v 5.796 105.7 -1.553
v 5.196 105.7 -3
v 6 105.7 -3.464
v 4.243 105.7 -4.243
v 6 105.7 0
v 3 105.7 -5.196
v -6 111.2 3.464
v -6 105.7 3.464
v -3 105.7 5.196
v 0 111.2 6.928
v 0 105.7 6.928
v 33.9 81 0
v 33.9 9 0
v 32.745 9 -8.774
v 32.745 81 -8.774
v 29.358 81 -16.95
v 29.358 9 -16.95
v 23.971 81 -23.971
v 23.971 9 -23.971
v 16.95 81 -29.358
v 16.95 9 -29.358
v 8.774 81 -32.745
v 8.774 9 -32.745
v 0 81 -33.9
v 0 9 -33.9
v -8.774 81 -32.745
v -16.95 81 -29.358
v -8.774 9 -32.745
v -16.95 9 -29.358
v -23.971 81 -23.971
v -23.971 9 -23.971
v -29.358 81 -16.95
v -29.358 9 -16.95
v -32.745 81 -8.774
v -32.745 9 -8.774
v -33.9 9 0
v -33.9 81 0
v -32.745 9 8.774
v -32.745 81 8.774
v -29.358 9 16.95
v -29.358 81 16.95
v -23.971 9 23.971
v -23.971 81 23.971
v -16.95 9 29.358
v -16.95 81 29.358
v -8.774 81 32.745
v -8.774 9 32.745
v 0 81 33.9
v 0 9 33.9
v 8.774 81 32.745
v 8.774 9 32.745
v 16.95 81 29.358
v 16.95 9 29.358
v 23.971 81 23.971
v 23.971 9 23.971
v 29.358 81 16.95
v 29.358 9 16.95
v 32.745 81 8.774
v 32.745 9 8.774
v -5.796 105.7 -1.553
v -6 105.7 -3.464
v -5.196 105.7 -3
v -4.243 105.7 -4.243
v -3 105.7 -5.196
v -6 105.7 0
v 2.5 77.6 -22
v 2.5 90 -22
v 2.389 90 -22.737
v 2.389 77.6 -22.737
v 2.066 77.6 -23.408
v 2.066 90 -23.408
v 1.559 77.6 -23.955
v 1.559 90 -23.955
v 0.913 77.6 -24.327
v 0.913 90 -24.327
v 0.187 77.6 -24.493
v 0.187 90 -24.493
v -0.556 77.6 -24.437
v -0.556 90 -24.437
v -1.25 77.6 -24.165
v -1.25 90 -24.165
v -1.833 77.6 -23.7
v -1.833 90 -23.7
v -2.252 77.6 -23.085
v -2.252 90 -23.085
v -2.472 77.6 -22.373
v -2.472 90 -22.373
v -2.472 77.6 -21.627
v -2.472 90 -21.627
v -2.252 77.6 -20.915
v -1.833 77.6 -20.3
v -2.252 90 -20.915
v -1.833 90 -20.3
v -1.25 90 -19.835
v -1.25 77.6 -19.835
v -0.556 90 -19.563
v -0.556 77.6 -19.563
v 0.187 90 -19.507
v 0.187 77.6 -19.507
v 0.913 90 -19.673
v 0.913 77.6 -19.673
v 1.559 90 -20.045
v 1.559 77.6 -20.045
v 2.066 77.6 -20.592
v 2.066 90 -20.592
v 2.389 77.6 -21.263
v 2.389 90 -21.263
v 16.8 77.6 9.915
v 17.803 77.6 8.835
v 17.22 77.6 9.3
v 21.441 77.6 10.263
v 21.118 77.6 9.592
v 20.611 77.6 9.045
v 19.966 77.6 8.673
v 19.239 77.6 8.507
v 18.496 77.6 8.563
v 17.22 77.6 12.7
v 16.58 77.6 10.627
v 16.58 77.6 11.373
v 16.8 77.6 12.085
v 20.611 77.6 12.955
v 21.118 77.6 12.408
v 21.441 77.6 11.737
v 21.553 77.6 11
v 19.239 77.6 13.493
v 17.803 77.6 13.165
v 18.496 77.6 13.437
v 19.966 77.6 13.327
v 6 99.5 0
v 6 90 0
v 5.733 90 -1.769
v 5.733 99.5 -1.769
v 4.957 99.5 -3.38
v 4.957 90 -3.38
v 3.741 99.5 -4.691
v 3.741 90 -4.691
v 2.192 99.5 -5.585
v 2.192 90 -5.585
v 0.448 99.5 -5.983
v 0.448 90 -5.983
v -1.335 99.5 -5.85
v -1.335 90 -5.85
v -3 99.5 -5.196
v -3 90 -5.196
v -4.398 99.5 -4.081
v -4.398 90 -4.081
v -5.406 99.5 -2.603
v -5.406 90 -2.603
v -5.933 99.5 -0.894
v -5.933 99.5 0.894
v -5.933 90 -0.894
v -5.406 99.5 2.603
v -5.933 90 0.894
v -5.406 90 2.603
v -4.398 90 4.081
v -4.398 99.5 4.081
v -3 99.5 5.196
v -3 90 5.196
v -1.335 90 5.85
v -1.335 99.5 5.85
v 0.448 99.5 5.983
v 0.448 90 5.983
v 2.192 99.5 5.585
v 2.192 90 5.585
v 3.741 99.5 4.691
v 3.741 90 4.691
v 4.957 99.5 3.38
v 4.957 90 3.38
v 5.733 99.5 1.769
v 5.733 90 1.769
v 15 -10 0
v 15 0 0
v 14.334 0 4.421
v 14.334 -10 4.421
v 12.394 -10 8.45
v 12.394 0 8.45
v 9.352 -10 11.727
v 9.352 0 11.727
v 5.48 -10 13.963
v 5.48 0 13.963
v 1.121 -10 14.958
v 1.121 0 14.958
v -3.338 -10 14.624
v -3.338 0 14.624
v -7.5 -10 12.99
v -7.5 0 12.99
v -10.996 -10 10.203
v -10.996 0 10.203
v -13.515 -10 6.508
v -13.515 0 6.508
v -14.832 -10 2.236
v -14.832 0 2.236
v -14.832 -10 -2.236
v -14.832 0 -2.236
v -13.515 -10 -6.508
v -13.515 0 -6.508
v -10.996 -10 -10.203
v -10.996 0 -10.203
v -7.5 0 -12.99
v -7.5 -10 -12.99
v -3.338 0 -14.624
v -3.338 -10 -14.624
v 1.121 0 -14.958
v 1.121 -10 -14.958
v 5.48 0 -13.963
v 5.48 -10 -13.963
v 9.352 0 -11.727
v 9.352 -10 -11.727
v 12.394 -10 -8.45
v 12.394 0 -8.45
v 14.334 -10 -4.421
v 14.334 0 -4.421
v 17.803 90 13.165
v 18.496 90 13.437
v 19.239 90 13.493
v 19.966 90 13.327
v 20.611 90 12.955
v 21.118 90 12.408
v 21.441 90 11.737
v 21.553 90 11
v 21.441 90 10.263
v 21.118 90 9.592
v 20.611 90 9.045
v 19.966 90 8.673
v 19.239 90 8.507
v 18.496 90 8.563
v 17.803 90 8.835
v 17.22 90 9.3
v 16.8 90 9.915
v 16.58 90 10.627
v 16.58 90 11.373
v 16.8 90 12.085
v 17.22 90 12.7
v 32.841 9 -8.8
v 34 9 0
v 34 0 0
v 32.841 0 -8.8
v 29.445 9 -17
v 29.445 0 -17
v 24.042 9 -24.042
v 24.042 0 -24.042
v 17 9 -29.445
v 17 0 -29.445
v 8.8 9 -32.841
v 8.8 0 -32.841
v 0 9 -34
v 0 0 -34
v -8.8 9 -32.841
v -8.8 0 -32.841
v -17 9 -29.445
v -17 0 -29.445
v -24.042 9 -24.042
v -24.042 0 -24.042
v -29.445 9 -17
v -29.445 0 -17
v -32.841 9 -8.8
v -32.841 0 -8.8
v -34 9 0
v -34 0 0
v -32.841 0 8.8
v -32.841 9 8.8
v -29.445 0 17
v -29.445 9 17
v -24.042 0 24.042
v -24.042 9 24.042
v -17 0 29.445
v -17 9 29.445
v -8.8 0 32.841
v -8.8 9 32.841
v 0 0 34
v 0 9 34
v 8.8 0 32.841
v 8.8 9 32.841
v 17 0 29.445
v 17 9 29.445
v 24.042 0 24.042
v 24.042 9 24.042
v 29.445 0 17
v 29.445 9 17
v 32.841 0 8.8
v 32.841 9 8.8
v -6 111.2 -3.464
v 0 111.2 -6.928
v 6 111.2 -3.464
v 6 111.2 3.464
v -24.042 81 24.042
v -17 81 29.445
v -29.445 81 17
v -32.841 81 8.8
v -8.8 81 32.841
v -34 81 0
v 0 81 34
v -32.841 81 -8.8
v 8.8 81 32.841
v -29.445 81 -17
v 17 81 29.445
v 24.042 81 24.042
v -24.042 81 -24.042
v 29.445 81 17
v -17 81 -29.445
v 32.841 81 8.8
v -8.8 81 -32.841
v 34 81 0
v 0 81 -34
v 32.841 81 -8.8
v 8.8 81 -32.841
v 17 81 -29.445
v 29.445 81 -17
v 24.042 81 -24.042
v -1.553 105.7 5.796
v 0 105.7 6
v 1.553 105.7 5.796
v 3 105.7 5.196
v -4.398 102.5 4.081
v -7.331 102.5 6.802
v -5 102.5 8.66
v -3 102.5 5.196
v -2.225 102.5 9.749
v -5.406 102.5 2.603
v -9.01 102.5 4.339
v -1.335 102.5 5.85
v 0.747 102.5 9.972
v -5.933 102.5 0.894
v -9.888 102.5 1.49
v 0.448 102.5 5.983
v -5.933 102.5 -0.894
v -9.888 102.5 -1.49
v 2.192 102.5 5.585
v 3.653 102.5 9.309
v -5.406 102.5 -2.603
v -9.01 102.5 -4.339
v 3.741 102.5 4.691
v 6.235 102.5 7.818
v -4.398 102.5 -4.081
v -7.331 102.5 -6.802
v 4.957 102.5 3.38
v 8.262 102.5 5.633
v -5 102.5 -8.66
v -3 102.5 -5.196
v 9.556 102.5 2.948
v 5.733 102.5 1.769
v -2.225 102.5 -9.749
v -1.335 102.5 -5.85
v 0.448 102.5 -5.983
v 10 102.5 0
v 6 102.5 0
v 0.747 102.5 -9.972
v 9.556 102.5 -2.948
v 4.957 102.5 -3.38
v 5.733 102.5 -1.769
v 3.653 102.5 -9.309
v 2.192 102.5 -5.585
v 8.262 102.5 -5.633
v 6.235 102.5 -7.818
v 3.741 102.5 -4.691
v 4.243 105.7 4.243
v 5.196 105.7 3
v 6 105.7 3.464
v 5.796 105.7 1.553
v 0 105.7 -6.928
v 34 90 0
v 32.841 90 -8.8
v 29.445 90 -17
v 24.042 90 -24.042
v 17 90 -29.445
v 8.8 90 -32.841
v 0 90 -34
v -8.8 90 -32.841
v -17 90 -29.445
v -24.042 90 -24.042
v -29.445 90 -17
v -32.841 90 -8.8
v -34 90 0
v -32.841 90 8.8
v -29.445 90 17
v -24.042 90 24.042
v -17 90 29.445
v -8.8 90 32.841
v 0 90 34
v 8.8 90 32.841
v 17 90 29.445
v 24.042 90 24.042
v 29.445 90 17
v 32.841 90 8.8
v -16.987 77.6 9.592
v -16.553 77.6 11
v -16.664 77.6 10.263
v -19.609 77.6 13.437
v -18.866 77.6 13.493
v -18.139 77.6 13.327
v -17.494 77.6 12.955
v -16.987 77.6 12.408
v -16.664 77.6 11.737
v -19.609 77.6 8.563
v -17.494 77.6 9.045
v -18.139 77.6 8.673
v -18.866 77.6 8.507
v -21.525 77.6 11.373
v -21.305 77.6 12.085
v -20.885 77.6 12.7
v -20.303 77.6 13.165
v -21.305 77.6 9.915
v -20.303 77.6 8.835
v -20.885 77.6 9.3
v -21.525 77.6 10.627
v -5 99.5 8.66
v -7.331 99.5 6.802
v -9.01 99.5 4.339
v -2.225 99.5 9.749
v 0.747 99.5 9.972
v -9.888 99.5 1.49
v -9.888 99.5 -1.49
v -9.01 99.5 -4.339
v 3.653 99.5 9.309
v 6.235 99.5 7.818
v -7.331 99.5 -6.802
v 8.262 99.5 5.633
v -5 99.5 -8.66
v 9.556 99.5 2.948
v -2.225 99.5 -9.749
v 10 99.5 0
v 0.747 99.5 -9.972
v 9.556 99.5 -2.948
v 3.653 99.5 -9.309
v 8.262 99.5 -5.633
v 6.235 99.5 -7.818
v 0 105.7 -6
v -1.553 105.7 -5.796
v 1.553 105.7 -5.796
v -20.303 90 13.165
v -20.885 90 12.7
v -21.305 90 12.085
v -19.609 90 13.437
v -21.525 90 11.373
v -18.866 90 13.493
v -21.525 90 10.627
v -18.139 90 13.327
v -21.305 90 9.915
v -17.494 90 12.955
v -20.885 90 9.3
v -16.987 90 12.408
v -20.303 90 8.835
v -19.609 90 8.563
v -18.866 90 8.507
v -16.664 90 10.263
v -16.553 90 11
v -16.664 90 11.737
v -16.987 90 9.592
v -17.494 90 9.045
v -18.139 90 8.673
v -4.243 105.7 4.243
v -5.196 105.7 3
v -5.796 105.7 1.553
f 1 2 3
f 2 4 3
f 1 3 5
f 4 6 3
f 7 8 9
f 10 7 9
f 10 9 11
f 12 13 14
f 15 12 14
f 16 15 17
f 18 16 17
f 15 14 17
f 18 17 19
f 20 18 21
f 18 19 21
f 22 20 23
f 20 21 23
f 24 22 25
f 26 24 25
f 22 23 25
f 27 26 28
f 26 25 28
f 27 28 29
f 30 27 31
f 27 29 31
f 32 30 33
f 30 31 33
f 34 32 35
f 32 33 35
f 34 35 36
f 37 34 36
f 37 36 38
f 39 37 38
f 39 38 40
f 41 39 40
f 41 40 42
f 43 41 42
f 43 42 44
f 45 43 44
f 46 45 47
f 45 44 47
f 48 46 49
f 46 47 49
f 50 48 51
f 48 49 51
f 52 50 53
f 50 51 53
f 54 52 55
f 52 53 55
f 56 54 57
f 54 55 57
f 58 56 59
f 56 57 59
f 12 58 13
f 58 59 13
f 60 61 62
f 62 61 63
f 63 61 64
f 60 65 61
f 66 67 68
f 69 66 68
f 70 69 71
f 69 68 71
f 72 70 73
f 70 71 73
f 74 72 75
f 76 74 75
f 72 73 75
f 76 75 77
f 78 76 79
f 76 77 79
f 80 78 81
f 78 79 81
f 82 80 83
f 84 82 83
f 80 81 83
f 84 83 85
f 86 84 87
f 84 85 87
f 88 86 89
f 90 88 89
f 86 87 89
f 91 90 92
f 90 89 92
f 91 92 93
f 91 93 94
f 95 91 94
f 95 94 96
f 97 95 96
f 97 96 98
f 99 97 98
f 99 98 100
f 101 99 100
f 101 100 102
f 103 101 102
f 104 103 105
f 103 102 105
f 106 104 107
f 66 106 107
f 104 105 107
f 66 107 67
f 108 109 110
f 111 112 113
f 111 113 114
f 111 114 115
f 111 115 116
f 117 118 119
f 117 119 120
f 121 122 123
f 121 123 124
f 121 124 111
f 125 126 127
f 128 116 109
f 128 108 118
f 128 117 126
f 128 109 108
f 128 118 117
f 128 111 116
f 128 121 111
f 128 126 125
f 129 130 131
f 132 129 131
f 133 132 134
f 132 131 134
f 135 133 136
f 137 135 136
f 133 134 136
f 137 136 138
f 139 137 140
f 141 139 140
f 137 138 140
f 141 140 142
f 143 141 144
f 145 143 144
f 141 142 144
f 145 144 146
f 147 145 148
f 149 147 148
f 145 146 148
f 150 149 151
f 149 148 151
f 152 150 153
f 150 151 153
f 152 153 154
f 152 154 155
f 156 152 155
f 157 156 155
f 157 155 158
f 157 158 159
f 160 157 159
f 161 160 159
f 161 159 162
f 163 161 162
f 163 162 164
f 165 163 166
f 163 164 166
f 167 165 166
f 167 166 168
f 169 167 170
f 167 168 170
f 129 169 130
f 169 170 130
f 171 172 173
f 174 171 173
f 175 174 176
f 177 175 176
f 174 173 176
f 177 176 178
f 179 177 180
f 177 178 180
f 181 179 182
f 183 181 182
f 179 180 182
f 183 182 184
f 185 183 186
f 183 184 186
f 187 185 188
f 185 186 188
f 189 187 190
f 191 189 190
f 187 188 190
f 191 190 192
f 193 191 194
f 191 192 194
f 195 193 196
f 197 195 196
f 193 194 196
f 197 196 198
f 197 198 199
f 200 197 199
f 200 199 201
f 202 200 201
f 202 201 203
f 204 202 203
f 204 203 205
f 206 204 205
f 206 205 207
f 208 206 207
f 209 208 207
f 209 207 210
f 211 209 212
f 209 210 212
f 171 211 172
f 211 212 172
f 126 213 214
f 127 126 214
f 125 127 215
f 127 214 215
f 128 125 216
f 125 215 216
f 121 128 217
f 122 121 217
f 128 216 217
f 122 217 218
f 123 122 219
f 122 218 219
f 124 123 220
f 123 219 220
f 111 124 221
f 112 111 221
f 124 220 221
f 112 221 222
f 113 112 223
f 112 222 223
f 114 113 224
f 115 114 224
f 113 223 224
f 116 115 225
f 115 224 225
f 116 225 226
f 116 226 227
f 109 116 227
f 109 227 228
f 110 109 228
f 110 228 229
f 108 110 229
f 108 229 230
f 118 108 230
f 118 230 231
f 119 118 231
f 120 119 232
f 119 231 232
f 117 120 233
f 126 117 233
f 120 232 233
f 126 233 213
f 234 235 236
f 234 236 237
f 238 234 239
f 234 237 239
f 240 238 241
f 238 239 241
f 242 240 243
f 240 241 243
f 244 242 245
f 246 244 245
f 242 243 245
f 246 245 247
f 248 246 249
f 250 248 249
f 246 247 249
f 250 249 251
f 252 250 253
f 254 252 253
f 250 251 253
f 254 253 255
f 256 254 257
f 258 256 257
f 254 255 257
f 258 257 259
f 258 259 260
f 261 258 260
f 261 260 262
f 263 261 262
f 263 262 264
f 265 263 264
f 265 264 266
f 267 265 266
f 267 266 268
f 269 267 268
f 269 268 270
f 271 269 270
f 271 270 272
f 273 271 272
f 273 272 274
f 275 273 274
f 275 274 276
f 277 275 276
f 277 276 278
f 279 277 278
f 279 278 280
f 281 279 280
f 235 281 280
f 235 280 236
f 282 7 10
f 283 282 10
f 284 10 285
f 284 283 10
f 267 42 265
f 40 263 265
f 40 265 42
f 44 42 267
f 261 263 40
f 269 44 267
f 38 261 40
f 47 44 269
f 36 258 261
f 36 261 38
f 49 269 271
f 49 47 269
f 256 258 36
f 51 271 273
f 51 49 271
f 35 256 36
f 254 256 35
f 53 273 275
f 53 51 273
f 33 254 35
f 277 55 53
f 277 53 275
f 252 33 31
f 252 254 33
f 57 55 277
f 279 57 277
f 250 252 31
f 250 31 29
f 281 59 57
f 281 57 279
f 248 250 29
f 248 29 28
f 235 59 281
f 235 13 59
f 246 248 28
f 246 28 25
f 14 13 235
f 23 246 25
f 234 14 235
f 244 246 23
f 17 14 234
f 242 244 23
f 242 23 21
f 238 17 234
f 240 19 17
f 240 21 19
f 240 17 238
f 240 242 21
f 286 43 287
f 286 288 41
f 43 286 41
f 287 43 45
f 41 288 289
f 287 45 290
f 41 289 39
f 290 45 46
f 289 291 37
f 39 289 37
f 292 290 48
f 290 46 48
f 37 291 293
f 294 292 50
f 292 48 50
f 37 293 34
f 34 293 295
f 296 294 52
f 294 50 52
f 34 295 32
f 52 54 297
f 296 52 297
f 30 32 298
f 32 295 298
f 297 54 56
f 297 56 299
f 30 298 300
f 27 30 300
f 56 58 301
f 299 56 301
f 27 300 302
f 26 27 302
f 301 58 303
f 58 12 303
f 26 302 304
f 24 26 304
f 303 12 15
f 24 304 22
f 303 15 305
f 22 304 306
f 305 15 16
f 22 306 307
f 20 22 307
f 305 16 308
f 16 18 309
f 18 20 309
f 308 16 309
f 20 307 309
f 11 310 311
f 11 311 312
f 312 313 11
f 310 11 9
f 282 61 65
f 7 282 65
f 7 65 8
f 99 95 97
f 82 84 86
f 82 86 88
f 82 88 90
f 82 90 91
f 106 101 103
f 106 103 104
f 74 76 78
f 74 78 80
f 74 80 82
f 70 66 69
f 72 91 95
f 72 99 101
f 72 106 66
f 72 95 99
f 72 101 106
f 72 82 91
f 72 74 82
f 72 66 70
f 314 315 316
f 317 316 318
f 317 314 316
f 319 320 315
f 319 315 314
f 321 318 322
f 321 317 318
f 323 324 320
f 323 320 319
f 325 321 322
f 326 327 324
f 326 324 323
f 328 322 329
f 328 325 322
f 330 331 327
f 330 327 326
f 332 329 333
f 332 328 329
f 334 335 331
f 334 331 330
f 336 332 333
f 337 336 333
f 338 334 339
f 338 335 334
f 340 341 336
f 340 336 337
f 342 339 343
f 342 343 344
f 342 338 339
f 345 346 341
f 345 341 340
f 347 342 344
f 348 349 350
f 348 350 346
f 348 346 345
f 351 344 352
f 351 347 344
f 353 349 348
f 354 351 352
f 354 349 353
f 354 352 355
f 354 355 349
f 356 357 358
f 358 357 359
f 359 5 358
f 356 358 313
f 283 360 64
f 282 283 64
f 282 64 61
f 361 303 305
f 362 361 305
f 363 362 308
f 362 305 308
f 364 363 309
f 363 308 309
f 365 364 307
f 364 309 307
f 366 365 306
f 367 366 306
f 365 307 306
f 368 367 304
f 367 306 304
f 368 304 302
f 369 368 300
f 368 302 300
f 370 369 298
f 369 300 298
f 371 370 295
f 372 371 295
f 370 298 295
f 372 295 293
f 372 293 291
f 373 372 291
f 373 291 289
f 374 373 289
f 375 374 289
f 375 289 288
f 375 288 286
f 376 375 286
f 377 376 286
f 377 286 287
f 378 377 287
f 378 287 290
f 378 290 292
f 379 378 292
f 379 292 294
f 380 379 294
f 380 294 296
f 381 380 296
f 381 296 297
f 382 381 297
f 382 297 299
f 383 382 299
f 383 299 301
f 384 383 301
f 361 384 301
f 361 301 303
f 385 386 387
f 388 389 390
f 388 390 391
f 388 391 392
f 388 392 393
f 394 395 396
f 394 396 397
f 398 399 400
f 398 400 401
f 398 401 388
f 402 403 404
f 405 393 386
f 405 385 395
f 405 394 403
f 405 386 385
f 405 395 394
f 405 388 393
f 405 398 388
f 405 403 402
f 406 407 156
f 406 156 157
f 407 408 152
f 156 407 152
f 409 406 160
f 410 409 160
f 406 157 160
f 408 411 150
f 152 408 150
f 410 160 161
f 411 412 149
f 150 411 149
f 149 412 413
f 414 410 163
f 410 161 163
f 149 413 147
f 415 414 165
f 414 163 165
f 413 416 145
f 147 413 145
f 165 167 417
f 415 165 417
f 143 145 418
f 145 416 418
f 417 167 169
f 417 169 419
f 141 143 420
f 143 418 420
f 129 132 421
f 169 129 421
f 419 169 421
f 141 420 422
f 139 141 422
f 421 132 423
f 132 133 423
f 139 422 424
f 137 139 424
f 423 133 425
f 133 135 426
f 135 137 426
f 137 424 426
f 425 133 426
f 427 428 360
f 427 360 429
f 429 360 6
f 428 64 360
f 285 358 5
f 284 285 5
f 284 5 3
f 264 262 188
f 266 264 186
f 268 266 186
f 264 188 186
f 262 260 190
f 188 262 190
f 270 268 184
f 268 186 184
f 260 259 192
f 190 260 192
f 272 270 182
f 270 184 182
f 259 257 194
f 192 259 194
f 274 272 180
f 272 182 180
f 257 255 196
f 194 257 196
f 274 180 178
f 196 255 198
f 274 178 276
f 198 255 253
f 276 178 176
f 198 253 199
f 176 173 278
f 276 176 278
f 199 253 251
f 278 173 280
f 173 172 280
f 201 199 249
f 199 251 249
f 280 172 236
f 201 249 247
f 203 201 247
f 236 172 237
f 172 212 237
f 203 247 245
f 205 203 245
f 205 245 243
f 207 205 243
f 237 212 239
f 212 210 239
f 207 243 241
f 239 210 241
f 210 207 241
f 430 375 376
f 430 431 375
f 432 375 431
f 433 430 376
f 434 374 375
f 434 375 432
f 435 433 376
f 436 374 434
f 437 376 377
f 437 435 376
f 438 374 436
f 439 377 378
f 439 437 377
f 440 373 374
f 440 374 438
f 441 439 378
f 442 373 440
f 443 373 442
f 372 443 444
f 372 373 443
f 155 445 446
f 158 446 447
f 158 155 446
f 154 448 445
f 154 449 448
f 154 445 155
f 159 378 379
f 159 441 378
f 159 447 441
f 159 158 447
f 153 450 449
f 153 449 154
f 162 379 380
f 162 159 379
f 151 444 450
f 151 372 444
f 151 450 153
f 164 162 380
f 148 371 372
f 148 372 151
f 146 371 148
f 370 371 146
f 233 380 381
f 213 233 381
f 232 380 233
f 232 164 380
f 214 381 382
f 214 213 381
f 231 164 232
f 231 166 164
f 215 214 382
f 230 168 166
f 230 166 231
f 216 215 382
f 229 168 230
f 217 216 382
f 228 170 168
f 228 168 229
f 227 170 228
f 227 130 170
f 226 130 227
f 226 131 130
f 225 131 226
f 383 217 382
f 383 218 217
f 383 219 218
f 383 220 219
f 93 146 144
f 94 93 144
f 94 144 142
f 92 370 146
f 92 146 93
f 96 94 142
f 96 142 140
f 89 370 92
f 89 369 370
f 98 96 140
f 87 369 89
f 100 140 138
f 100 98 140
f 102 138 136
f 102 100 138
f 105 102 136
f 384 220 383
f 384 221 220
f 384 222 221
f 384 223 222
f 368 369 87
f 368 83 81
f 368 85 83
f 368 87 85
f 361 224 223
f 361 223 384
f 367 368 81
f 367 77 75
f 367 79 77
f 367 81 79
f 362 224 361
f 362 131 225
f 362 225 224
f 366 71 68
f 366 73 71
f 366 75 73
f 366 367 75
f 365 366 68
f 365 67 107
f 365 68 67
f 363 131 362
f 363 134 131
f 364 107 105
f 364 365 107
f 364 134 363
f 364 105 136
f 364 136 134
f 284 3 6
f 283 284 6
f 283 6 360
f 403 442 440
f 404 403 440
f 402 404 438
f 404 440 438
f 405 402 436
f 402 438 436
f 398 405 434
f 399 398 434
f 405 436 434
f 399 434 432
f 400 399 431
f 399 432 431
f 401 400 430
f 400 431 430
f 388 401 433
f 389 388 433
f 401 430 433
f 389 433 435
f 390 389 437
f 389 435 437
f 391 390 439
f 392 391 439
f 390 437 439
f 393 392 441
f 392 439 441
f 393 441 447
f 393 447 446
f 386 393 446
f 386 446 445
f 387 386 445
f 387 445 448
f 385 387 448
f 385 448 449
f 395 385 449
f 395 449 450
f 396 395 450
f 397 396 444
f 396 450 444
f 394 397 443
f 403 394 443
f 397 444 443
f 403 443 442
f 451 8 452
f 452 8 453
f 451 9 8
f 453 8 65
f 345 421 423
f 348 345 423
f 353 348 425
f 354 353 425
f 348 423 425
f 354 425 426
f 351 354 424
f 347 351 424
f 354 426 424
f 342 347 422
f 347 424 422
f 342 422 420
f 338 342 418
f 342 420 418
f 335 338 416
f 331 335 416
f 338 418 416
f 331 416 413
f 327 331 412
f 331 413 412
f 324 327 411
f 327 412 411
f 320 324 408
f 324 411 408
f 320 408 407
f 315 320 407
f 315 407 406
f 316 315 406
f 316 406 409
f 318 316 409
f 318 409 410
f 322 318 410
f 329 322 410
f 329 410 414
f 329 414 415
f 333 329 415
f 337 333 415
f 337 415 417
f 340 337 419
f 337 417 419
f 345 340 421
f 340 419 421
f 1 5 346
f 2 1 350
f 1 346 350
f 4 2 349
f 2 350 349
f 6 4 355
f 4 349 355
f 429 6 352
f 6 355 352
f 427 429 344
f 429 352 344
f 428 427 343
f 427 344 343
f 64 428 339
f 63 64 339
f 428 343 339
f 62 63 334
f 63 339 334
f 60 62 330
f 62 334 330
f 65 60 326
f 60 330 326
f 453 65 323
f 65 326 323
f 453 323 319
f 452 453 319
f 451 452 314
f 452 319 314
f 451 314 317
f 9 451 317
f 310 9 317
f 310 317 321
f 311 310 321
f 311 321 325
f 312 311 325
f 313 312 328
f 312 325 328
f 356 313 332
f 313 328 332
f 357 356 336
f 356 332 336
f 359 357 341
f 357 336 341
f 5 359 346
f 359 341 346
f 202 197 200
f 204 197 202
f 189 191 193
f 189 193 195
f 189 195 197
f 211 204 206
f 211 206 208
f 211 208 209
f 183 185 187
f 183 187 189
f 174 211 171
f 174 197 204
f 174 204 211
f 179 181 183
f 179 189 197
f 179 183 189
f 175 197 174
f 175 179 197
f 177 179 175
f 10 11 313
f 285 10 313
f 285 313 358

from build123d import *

# Parameters (mm, degrees)
SKETCH1_R                  = 34
MAINHOUSING_DEPTH          = 90
SKETCH2_R                  = 15
REARPART_DEPTH             = 10
SKETCH3_R                  = 6
SHAFT_DEPTH                = 9.5
SKETCH4_R                  = 10
GEAR_DEPTH                 = 3
HEXBOLT_DEPTH              = 8.7
SKETCH6_R                  = 10
SKETCH6_R_2                = 6
HEXBOLTCUTOUT_DEPTH        = 3.2
TOP_BOTTOMSEPERATION_START = 9
SKETCH7_R                  = 34
SKETCH7_R_2                = 33.9
TOP_BOTTOMSEPERATION_DEPTH = 72
SKETCH8_R                  = 2.5
SCREWHOLE_DEPTH            = 12.4
SCREWHOLEPATTERN_COUNT     = 3


with BuildPart() as part:
    # Sketch1 → MainHousing (new body)
    with BuildSketch(Plane(origin=(0, 0, 0), x_dir=(1, 0, 0), z_dir=(0, 1, 0))):
        Circle(SKETCH1_R)
    extrude(amount=MAINHOUSING_DEPTH)

    # Sketch2 → RearPart (add)
    with BuildSketch(Plane.XZ):
        Circle(SKETCH2_R)
    extrude(amount=REARPART_DEPTH)

    # Sketch3 → Shaft (add)
    with BuildSketch(Plane(origin=(0, 90, 0), x_dir=(1, 0, 0), z_dir=(0, 1, 0))):
        Circle(SKETCH3_R)
    extrude(amount=SHAFT_DEPTH)

    # Sketch4 → Gear (add)
    with BuildSketch(Plane(origin=(0, 99.5, 0), x_dir=(1, 0, 0), z_dir=(0, 1, 0))):
        Circle(SKETCH4_R)
    extrude(amount=GEAR_DEPTH)

    # Sketch5 → HexBolt (add)
    with BuildSketch(Plane(origin=(0, 102.5, 0), x_dir=(1, 0, 0), z_dir=(0, 1, 0))):
        Polygon((0, 6.92820323), (-6, 3.464101615), (-6, -3.464101615), (0, -6.92820323), (6, -3.464101615), (6, 3.464101615), align=None)
    extrude(amount=HEXBOLT_DEPTH)

    # Sketch6 → HexBoltCutout (cut)
    with BuildSketch(Plane(origin=(0, 102.5, 0), x_dir=(1, 0, 0), z_dir=(0, 1, 0))):
        Circle(SKETCH6_R)
        Circle(SKETCH6_R_2, mode=Mode.SUBTRACT)
    extrude(amount=HEXBOLTCUTOUT_DEPTH, mode=Mode.SUBTRACT)

    # Sketch7 → Top/BottomSeperation (cut)
    with BuildSketch(Plane(origin=(0, 0, 0), x_dir=(1, 0, 0), z_dir=(0, 1, 0)).offset(TOP_BOTTOMSEPERATION_START)):
        Circle(SKETCH7_R)
        Circle(SKETCH7_R_2, mode=Mode.SUBTRACT)
    extrude(amount=TOP_BOTTOMSEPERATION_DEPTH, mode=Mode.SUBTRACT)

    # Sketch8 → ScrewHole (cut)
    with BuildSketch(Plane(origin=(0, 90, 0), x_dir=(1, 0, 0), z_dir=(0, 1, 0))):
        with Locations((0, 22)):
            Circle(SKETCH8_R)
    screwhole = extrude(amount=-SCREWHOLE_DEPTH, mode=Mode.SUBTRACT)

    # ScrewHolePattern: ScrewHole ×3 about axis
    screwholepattern_axis = Axis((0, 0, 0), (0, 1, 0))
    for i in range(1, SCREWHOLEPATTERN_COUNT):
        add(screwhole.rotate(screwholepattern_axis, i * 360 / SCREWHOLEPATTERN_COUNT), mode=Mode.SUBTRACT)


solid = part.part
